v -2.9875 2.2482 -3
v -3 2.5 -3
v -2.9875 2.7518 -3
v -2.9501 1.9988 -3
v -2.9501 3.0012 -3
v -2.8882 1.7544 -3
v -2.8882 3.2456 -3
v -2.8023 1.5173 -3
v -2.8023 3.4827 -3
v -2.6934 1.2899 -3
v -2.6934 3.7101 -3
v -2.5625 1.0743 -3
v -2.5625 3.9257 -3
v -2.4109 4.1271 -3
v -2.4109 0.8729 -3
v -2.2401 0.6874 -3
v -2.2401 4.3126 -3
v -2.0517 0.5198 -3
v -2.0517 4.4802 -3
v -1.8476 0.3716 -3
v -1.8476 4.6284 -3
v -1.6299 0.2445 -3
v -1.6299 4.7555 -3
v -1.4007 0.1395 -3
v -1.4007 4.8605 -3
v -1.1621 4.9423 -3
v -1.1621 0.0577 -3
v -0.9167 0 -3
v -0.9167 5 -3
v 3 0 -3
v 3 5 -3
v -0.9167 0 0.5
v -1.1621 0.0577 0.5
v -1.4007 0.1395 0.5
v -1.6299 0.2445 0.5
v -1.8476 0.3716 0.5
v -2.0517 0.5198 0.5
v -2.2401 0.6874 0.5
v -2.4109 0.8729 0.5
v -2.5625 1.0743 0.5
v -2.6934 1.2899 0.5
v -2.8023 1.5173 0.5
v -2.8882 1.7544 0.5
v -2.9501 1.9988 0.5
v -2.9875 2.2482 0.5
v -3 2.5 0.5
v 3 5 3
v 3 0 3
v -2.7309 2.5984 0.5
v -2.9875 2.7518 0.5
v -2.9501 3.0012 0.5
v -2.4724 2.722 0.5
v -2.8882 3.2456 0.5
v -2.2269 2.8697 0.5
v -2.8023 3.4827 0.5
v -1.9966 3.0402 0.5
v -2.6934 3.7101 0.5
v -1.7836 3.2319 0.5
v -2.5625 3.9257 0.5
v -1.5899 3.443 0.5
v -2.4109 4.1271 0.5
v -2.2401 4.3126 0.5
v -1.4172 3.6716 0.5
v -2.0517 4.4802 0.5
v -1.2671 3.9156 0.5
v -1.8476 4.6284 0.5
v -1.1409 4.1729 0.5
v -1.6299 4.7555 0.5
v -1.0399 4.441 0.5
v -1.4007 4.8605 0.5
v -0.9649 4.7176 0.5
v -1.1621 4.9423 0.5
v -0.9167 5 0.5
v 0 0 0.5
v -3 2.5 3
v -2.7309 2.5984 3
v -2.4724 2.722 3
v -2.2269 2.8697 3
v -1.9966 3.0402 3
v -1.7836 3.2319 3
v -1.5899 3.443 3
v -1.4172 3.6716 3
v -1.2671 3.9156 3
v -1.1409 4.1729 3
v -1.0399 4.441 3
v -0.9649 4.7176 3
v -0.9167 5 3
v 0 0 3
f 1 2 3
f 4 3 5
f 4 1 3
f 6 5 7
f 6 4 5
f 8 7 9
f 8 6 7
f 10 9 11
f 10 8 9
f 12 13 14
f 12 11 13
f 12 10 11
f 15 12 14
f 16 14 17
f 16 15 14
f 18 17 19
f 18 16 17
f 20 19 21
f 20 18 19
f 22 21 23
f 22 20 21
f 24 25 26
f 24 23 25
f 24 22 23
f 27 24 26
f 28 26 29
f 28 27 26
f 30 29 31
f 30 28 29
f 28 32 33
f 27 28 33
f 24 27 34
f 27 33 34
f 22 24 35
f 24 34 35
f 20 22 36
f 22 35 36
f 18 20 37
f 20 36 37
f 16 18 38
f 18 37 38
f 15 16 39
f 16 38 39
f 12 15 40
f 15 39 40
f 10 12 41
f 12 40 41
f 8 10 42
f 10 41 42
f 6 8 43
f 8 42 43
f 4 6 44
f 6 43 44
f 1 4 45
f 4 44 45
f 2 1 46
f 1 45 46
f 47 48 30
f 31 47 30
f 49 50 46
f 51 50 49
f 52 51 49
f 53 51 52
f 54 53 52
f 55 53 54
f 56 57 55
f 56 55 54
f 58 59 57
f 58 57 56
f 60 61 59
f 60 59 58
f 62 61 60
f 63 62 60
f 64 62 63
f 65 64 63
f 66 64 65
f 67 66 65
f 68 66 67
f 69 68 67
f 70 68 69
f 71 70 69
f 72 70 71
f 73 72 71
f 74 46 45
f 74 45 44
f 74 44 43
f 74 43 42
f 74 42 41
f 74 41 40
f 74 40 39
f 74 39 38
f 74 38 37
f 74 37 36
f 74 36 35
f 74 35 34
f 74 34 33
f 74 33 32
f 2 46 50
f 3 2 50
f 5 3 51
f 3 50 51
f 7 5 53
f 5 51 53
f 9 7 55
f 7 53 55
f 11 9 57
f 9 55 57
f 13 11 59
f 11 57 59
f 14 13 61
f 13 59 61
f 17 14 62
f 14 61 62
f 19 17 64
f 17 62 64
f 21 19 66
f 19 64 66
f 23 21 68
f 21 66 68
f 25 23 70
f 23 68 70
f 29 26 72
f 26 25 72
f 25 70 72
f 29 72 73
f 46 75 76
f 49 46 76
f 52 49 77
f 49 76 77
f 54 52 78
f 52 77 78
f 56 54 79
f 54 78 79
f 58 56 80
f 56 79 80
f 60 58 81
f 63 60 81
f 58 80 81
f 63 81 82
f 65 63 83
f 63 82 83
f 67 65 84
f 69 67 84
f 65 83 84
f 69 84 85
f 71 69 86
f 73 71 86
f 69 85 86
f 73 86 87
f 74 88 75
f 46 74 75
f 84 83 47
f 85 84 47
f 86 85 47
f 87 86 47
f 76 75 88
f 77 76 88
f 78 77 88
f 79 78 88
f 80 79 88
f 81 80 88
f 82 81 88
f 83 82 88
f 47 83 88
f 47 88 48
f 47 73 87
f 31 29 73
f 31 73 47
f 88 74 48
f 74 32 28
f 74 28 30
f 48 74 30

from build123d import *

# Parameters (mm, degrees)
SKETCH1_W           = 6
SKETCH1_H           = 6
BOSS_EXTRUDE1_DEPTH = 5
CUT_EXTRUDE2_DEPTH  = 10
CUT_EXTRUDE3_DEPTH  = 2.5


with BuildPart() as part:
    # Sketch1 → Boss-Extrude1 (new body)
    with BuildSketch(Plane(origin=(0, 0, 0), x_dir=(1, 0, 0), z_dir=(0, 1, 0))):
        Rectangle(SKETCH1_W, SKETCH1_H)
    extrude(amount=BOSS_EXTRUDE1_DEPTH)

    # Sketch5 → Cut-Extrude2 (cut)
    with BuildSketch(Plane.XY.offset(3)):
        with BuildLine():
            Line((-3, 5), (-3, 2.5))
            ThreePointArc((-3, 2.5), (-2.410895752, 4.127135349), (-0.916666667, 5))
            Line((-0.916666667, 5), (-3, 5))
        make_face()
        with BuildLine():
            Line((-3, 0), (-0.916666667, 0))
            ThreePointArc((-0.916666667, 0), (-2.410895752, 0.872864651), (-3, 2.5))
            Line((-3, 2.5), (-3, 0))
        make_face()
    extrude(amount=-CUT_EXTRUDE2_DEPTH, mode=Mode.SUBTRACT)

    # Sketch6 → Cut-Extrude3 (cut)
    with BuildSketch(Plane.XY.offset(3)):
        with BuildLine():
            ThreePointArc((-0.916666667, 5), (-2.410895752, 4.127135349), (-3, 2.5))
            ThreePointArc((-3, 2.5), (-1.589896602, 3.44296939), (-0.916666667, 5))
        make_face()
        with BuildLine():
            Line((0, 0), (-3, 2.5))
            ThreePointArc((-3, 2.5), (-2.410895752, 0.872864651), (-0.916666667, 0))
            Line((-0.916666667, 0), (0, 0))
        make_face()
    extrude(amount=-CUT_EXTRUDE3_DEPTH, mode=Mode.SUBTRACT)


solid = part.part
